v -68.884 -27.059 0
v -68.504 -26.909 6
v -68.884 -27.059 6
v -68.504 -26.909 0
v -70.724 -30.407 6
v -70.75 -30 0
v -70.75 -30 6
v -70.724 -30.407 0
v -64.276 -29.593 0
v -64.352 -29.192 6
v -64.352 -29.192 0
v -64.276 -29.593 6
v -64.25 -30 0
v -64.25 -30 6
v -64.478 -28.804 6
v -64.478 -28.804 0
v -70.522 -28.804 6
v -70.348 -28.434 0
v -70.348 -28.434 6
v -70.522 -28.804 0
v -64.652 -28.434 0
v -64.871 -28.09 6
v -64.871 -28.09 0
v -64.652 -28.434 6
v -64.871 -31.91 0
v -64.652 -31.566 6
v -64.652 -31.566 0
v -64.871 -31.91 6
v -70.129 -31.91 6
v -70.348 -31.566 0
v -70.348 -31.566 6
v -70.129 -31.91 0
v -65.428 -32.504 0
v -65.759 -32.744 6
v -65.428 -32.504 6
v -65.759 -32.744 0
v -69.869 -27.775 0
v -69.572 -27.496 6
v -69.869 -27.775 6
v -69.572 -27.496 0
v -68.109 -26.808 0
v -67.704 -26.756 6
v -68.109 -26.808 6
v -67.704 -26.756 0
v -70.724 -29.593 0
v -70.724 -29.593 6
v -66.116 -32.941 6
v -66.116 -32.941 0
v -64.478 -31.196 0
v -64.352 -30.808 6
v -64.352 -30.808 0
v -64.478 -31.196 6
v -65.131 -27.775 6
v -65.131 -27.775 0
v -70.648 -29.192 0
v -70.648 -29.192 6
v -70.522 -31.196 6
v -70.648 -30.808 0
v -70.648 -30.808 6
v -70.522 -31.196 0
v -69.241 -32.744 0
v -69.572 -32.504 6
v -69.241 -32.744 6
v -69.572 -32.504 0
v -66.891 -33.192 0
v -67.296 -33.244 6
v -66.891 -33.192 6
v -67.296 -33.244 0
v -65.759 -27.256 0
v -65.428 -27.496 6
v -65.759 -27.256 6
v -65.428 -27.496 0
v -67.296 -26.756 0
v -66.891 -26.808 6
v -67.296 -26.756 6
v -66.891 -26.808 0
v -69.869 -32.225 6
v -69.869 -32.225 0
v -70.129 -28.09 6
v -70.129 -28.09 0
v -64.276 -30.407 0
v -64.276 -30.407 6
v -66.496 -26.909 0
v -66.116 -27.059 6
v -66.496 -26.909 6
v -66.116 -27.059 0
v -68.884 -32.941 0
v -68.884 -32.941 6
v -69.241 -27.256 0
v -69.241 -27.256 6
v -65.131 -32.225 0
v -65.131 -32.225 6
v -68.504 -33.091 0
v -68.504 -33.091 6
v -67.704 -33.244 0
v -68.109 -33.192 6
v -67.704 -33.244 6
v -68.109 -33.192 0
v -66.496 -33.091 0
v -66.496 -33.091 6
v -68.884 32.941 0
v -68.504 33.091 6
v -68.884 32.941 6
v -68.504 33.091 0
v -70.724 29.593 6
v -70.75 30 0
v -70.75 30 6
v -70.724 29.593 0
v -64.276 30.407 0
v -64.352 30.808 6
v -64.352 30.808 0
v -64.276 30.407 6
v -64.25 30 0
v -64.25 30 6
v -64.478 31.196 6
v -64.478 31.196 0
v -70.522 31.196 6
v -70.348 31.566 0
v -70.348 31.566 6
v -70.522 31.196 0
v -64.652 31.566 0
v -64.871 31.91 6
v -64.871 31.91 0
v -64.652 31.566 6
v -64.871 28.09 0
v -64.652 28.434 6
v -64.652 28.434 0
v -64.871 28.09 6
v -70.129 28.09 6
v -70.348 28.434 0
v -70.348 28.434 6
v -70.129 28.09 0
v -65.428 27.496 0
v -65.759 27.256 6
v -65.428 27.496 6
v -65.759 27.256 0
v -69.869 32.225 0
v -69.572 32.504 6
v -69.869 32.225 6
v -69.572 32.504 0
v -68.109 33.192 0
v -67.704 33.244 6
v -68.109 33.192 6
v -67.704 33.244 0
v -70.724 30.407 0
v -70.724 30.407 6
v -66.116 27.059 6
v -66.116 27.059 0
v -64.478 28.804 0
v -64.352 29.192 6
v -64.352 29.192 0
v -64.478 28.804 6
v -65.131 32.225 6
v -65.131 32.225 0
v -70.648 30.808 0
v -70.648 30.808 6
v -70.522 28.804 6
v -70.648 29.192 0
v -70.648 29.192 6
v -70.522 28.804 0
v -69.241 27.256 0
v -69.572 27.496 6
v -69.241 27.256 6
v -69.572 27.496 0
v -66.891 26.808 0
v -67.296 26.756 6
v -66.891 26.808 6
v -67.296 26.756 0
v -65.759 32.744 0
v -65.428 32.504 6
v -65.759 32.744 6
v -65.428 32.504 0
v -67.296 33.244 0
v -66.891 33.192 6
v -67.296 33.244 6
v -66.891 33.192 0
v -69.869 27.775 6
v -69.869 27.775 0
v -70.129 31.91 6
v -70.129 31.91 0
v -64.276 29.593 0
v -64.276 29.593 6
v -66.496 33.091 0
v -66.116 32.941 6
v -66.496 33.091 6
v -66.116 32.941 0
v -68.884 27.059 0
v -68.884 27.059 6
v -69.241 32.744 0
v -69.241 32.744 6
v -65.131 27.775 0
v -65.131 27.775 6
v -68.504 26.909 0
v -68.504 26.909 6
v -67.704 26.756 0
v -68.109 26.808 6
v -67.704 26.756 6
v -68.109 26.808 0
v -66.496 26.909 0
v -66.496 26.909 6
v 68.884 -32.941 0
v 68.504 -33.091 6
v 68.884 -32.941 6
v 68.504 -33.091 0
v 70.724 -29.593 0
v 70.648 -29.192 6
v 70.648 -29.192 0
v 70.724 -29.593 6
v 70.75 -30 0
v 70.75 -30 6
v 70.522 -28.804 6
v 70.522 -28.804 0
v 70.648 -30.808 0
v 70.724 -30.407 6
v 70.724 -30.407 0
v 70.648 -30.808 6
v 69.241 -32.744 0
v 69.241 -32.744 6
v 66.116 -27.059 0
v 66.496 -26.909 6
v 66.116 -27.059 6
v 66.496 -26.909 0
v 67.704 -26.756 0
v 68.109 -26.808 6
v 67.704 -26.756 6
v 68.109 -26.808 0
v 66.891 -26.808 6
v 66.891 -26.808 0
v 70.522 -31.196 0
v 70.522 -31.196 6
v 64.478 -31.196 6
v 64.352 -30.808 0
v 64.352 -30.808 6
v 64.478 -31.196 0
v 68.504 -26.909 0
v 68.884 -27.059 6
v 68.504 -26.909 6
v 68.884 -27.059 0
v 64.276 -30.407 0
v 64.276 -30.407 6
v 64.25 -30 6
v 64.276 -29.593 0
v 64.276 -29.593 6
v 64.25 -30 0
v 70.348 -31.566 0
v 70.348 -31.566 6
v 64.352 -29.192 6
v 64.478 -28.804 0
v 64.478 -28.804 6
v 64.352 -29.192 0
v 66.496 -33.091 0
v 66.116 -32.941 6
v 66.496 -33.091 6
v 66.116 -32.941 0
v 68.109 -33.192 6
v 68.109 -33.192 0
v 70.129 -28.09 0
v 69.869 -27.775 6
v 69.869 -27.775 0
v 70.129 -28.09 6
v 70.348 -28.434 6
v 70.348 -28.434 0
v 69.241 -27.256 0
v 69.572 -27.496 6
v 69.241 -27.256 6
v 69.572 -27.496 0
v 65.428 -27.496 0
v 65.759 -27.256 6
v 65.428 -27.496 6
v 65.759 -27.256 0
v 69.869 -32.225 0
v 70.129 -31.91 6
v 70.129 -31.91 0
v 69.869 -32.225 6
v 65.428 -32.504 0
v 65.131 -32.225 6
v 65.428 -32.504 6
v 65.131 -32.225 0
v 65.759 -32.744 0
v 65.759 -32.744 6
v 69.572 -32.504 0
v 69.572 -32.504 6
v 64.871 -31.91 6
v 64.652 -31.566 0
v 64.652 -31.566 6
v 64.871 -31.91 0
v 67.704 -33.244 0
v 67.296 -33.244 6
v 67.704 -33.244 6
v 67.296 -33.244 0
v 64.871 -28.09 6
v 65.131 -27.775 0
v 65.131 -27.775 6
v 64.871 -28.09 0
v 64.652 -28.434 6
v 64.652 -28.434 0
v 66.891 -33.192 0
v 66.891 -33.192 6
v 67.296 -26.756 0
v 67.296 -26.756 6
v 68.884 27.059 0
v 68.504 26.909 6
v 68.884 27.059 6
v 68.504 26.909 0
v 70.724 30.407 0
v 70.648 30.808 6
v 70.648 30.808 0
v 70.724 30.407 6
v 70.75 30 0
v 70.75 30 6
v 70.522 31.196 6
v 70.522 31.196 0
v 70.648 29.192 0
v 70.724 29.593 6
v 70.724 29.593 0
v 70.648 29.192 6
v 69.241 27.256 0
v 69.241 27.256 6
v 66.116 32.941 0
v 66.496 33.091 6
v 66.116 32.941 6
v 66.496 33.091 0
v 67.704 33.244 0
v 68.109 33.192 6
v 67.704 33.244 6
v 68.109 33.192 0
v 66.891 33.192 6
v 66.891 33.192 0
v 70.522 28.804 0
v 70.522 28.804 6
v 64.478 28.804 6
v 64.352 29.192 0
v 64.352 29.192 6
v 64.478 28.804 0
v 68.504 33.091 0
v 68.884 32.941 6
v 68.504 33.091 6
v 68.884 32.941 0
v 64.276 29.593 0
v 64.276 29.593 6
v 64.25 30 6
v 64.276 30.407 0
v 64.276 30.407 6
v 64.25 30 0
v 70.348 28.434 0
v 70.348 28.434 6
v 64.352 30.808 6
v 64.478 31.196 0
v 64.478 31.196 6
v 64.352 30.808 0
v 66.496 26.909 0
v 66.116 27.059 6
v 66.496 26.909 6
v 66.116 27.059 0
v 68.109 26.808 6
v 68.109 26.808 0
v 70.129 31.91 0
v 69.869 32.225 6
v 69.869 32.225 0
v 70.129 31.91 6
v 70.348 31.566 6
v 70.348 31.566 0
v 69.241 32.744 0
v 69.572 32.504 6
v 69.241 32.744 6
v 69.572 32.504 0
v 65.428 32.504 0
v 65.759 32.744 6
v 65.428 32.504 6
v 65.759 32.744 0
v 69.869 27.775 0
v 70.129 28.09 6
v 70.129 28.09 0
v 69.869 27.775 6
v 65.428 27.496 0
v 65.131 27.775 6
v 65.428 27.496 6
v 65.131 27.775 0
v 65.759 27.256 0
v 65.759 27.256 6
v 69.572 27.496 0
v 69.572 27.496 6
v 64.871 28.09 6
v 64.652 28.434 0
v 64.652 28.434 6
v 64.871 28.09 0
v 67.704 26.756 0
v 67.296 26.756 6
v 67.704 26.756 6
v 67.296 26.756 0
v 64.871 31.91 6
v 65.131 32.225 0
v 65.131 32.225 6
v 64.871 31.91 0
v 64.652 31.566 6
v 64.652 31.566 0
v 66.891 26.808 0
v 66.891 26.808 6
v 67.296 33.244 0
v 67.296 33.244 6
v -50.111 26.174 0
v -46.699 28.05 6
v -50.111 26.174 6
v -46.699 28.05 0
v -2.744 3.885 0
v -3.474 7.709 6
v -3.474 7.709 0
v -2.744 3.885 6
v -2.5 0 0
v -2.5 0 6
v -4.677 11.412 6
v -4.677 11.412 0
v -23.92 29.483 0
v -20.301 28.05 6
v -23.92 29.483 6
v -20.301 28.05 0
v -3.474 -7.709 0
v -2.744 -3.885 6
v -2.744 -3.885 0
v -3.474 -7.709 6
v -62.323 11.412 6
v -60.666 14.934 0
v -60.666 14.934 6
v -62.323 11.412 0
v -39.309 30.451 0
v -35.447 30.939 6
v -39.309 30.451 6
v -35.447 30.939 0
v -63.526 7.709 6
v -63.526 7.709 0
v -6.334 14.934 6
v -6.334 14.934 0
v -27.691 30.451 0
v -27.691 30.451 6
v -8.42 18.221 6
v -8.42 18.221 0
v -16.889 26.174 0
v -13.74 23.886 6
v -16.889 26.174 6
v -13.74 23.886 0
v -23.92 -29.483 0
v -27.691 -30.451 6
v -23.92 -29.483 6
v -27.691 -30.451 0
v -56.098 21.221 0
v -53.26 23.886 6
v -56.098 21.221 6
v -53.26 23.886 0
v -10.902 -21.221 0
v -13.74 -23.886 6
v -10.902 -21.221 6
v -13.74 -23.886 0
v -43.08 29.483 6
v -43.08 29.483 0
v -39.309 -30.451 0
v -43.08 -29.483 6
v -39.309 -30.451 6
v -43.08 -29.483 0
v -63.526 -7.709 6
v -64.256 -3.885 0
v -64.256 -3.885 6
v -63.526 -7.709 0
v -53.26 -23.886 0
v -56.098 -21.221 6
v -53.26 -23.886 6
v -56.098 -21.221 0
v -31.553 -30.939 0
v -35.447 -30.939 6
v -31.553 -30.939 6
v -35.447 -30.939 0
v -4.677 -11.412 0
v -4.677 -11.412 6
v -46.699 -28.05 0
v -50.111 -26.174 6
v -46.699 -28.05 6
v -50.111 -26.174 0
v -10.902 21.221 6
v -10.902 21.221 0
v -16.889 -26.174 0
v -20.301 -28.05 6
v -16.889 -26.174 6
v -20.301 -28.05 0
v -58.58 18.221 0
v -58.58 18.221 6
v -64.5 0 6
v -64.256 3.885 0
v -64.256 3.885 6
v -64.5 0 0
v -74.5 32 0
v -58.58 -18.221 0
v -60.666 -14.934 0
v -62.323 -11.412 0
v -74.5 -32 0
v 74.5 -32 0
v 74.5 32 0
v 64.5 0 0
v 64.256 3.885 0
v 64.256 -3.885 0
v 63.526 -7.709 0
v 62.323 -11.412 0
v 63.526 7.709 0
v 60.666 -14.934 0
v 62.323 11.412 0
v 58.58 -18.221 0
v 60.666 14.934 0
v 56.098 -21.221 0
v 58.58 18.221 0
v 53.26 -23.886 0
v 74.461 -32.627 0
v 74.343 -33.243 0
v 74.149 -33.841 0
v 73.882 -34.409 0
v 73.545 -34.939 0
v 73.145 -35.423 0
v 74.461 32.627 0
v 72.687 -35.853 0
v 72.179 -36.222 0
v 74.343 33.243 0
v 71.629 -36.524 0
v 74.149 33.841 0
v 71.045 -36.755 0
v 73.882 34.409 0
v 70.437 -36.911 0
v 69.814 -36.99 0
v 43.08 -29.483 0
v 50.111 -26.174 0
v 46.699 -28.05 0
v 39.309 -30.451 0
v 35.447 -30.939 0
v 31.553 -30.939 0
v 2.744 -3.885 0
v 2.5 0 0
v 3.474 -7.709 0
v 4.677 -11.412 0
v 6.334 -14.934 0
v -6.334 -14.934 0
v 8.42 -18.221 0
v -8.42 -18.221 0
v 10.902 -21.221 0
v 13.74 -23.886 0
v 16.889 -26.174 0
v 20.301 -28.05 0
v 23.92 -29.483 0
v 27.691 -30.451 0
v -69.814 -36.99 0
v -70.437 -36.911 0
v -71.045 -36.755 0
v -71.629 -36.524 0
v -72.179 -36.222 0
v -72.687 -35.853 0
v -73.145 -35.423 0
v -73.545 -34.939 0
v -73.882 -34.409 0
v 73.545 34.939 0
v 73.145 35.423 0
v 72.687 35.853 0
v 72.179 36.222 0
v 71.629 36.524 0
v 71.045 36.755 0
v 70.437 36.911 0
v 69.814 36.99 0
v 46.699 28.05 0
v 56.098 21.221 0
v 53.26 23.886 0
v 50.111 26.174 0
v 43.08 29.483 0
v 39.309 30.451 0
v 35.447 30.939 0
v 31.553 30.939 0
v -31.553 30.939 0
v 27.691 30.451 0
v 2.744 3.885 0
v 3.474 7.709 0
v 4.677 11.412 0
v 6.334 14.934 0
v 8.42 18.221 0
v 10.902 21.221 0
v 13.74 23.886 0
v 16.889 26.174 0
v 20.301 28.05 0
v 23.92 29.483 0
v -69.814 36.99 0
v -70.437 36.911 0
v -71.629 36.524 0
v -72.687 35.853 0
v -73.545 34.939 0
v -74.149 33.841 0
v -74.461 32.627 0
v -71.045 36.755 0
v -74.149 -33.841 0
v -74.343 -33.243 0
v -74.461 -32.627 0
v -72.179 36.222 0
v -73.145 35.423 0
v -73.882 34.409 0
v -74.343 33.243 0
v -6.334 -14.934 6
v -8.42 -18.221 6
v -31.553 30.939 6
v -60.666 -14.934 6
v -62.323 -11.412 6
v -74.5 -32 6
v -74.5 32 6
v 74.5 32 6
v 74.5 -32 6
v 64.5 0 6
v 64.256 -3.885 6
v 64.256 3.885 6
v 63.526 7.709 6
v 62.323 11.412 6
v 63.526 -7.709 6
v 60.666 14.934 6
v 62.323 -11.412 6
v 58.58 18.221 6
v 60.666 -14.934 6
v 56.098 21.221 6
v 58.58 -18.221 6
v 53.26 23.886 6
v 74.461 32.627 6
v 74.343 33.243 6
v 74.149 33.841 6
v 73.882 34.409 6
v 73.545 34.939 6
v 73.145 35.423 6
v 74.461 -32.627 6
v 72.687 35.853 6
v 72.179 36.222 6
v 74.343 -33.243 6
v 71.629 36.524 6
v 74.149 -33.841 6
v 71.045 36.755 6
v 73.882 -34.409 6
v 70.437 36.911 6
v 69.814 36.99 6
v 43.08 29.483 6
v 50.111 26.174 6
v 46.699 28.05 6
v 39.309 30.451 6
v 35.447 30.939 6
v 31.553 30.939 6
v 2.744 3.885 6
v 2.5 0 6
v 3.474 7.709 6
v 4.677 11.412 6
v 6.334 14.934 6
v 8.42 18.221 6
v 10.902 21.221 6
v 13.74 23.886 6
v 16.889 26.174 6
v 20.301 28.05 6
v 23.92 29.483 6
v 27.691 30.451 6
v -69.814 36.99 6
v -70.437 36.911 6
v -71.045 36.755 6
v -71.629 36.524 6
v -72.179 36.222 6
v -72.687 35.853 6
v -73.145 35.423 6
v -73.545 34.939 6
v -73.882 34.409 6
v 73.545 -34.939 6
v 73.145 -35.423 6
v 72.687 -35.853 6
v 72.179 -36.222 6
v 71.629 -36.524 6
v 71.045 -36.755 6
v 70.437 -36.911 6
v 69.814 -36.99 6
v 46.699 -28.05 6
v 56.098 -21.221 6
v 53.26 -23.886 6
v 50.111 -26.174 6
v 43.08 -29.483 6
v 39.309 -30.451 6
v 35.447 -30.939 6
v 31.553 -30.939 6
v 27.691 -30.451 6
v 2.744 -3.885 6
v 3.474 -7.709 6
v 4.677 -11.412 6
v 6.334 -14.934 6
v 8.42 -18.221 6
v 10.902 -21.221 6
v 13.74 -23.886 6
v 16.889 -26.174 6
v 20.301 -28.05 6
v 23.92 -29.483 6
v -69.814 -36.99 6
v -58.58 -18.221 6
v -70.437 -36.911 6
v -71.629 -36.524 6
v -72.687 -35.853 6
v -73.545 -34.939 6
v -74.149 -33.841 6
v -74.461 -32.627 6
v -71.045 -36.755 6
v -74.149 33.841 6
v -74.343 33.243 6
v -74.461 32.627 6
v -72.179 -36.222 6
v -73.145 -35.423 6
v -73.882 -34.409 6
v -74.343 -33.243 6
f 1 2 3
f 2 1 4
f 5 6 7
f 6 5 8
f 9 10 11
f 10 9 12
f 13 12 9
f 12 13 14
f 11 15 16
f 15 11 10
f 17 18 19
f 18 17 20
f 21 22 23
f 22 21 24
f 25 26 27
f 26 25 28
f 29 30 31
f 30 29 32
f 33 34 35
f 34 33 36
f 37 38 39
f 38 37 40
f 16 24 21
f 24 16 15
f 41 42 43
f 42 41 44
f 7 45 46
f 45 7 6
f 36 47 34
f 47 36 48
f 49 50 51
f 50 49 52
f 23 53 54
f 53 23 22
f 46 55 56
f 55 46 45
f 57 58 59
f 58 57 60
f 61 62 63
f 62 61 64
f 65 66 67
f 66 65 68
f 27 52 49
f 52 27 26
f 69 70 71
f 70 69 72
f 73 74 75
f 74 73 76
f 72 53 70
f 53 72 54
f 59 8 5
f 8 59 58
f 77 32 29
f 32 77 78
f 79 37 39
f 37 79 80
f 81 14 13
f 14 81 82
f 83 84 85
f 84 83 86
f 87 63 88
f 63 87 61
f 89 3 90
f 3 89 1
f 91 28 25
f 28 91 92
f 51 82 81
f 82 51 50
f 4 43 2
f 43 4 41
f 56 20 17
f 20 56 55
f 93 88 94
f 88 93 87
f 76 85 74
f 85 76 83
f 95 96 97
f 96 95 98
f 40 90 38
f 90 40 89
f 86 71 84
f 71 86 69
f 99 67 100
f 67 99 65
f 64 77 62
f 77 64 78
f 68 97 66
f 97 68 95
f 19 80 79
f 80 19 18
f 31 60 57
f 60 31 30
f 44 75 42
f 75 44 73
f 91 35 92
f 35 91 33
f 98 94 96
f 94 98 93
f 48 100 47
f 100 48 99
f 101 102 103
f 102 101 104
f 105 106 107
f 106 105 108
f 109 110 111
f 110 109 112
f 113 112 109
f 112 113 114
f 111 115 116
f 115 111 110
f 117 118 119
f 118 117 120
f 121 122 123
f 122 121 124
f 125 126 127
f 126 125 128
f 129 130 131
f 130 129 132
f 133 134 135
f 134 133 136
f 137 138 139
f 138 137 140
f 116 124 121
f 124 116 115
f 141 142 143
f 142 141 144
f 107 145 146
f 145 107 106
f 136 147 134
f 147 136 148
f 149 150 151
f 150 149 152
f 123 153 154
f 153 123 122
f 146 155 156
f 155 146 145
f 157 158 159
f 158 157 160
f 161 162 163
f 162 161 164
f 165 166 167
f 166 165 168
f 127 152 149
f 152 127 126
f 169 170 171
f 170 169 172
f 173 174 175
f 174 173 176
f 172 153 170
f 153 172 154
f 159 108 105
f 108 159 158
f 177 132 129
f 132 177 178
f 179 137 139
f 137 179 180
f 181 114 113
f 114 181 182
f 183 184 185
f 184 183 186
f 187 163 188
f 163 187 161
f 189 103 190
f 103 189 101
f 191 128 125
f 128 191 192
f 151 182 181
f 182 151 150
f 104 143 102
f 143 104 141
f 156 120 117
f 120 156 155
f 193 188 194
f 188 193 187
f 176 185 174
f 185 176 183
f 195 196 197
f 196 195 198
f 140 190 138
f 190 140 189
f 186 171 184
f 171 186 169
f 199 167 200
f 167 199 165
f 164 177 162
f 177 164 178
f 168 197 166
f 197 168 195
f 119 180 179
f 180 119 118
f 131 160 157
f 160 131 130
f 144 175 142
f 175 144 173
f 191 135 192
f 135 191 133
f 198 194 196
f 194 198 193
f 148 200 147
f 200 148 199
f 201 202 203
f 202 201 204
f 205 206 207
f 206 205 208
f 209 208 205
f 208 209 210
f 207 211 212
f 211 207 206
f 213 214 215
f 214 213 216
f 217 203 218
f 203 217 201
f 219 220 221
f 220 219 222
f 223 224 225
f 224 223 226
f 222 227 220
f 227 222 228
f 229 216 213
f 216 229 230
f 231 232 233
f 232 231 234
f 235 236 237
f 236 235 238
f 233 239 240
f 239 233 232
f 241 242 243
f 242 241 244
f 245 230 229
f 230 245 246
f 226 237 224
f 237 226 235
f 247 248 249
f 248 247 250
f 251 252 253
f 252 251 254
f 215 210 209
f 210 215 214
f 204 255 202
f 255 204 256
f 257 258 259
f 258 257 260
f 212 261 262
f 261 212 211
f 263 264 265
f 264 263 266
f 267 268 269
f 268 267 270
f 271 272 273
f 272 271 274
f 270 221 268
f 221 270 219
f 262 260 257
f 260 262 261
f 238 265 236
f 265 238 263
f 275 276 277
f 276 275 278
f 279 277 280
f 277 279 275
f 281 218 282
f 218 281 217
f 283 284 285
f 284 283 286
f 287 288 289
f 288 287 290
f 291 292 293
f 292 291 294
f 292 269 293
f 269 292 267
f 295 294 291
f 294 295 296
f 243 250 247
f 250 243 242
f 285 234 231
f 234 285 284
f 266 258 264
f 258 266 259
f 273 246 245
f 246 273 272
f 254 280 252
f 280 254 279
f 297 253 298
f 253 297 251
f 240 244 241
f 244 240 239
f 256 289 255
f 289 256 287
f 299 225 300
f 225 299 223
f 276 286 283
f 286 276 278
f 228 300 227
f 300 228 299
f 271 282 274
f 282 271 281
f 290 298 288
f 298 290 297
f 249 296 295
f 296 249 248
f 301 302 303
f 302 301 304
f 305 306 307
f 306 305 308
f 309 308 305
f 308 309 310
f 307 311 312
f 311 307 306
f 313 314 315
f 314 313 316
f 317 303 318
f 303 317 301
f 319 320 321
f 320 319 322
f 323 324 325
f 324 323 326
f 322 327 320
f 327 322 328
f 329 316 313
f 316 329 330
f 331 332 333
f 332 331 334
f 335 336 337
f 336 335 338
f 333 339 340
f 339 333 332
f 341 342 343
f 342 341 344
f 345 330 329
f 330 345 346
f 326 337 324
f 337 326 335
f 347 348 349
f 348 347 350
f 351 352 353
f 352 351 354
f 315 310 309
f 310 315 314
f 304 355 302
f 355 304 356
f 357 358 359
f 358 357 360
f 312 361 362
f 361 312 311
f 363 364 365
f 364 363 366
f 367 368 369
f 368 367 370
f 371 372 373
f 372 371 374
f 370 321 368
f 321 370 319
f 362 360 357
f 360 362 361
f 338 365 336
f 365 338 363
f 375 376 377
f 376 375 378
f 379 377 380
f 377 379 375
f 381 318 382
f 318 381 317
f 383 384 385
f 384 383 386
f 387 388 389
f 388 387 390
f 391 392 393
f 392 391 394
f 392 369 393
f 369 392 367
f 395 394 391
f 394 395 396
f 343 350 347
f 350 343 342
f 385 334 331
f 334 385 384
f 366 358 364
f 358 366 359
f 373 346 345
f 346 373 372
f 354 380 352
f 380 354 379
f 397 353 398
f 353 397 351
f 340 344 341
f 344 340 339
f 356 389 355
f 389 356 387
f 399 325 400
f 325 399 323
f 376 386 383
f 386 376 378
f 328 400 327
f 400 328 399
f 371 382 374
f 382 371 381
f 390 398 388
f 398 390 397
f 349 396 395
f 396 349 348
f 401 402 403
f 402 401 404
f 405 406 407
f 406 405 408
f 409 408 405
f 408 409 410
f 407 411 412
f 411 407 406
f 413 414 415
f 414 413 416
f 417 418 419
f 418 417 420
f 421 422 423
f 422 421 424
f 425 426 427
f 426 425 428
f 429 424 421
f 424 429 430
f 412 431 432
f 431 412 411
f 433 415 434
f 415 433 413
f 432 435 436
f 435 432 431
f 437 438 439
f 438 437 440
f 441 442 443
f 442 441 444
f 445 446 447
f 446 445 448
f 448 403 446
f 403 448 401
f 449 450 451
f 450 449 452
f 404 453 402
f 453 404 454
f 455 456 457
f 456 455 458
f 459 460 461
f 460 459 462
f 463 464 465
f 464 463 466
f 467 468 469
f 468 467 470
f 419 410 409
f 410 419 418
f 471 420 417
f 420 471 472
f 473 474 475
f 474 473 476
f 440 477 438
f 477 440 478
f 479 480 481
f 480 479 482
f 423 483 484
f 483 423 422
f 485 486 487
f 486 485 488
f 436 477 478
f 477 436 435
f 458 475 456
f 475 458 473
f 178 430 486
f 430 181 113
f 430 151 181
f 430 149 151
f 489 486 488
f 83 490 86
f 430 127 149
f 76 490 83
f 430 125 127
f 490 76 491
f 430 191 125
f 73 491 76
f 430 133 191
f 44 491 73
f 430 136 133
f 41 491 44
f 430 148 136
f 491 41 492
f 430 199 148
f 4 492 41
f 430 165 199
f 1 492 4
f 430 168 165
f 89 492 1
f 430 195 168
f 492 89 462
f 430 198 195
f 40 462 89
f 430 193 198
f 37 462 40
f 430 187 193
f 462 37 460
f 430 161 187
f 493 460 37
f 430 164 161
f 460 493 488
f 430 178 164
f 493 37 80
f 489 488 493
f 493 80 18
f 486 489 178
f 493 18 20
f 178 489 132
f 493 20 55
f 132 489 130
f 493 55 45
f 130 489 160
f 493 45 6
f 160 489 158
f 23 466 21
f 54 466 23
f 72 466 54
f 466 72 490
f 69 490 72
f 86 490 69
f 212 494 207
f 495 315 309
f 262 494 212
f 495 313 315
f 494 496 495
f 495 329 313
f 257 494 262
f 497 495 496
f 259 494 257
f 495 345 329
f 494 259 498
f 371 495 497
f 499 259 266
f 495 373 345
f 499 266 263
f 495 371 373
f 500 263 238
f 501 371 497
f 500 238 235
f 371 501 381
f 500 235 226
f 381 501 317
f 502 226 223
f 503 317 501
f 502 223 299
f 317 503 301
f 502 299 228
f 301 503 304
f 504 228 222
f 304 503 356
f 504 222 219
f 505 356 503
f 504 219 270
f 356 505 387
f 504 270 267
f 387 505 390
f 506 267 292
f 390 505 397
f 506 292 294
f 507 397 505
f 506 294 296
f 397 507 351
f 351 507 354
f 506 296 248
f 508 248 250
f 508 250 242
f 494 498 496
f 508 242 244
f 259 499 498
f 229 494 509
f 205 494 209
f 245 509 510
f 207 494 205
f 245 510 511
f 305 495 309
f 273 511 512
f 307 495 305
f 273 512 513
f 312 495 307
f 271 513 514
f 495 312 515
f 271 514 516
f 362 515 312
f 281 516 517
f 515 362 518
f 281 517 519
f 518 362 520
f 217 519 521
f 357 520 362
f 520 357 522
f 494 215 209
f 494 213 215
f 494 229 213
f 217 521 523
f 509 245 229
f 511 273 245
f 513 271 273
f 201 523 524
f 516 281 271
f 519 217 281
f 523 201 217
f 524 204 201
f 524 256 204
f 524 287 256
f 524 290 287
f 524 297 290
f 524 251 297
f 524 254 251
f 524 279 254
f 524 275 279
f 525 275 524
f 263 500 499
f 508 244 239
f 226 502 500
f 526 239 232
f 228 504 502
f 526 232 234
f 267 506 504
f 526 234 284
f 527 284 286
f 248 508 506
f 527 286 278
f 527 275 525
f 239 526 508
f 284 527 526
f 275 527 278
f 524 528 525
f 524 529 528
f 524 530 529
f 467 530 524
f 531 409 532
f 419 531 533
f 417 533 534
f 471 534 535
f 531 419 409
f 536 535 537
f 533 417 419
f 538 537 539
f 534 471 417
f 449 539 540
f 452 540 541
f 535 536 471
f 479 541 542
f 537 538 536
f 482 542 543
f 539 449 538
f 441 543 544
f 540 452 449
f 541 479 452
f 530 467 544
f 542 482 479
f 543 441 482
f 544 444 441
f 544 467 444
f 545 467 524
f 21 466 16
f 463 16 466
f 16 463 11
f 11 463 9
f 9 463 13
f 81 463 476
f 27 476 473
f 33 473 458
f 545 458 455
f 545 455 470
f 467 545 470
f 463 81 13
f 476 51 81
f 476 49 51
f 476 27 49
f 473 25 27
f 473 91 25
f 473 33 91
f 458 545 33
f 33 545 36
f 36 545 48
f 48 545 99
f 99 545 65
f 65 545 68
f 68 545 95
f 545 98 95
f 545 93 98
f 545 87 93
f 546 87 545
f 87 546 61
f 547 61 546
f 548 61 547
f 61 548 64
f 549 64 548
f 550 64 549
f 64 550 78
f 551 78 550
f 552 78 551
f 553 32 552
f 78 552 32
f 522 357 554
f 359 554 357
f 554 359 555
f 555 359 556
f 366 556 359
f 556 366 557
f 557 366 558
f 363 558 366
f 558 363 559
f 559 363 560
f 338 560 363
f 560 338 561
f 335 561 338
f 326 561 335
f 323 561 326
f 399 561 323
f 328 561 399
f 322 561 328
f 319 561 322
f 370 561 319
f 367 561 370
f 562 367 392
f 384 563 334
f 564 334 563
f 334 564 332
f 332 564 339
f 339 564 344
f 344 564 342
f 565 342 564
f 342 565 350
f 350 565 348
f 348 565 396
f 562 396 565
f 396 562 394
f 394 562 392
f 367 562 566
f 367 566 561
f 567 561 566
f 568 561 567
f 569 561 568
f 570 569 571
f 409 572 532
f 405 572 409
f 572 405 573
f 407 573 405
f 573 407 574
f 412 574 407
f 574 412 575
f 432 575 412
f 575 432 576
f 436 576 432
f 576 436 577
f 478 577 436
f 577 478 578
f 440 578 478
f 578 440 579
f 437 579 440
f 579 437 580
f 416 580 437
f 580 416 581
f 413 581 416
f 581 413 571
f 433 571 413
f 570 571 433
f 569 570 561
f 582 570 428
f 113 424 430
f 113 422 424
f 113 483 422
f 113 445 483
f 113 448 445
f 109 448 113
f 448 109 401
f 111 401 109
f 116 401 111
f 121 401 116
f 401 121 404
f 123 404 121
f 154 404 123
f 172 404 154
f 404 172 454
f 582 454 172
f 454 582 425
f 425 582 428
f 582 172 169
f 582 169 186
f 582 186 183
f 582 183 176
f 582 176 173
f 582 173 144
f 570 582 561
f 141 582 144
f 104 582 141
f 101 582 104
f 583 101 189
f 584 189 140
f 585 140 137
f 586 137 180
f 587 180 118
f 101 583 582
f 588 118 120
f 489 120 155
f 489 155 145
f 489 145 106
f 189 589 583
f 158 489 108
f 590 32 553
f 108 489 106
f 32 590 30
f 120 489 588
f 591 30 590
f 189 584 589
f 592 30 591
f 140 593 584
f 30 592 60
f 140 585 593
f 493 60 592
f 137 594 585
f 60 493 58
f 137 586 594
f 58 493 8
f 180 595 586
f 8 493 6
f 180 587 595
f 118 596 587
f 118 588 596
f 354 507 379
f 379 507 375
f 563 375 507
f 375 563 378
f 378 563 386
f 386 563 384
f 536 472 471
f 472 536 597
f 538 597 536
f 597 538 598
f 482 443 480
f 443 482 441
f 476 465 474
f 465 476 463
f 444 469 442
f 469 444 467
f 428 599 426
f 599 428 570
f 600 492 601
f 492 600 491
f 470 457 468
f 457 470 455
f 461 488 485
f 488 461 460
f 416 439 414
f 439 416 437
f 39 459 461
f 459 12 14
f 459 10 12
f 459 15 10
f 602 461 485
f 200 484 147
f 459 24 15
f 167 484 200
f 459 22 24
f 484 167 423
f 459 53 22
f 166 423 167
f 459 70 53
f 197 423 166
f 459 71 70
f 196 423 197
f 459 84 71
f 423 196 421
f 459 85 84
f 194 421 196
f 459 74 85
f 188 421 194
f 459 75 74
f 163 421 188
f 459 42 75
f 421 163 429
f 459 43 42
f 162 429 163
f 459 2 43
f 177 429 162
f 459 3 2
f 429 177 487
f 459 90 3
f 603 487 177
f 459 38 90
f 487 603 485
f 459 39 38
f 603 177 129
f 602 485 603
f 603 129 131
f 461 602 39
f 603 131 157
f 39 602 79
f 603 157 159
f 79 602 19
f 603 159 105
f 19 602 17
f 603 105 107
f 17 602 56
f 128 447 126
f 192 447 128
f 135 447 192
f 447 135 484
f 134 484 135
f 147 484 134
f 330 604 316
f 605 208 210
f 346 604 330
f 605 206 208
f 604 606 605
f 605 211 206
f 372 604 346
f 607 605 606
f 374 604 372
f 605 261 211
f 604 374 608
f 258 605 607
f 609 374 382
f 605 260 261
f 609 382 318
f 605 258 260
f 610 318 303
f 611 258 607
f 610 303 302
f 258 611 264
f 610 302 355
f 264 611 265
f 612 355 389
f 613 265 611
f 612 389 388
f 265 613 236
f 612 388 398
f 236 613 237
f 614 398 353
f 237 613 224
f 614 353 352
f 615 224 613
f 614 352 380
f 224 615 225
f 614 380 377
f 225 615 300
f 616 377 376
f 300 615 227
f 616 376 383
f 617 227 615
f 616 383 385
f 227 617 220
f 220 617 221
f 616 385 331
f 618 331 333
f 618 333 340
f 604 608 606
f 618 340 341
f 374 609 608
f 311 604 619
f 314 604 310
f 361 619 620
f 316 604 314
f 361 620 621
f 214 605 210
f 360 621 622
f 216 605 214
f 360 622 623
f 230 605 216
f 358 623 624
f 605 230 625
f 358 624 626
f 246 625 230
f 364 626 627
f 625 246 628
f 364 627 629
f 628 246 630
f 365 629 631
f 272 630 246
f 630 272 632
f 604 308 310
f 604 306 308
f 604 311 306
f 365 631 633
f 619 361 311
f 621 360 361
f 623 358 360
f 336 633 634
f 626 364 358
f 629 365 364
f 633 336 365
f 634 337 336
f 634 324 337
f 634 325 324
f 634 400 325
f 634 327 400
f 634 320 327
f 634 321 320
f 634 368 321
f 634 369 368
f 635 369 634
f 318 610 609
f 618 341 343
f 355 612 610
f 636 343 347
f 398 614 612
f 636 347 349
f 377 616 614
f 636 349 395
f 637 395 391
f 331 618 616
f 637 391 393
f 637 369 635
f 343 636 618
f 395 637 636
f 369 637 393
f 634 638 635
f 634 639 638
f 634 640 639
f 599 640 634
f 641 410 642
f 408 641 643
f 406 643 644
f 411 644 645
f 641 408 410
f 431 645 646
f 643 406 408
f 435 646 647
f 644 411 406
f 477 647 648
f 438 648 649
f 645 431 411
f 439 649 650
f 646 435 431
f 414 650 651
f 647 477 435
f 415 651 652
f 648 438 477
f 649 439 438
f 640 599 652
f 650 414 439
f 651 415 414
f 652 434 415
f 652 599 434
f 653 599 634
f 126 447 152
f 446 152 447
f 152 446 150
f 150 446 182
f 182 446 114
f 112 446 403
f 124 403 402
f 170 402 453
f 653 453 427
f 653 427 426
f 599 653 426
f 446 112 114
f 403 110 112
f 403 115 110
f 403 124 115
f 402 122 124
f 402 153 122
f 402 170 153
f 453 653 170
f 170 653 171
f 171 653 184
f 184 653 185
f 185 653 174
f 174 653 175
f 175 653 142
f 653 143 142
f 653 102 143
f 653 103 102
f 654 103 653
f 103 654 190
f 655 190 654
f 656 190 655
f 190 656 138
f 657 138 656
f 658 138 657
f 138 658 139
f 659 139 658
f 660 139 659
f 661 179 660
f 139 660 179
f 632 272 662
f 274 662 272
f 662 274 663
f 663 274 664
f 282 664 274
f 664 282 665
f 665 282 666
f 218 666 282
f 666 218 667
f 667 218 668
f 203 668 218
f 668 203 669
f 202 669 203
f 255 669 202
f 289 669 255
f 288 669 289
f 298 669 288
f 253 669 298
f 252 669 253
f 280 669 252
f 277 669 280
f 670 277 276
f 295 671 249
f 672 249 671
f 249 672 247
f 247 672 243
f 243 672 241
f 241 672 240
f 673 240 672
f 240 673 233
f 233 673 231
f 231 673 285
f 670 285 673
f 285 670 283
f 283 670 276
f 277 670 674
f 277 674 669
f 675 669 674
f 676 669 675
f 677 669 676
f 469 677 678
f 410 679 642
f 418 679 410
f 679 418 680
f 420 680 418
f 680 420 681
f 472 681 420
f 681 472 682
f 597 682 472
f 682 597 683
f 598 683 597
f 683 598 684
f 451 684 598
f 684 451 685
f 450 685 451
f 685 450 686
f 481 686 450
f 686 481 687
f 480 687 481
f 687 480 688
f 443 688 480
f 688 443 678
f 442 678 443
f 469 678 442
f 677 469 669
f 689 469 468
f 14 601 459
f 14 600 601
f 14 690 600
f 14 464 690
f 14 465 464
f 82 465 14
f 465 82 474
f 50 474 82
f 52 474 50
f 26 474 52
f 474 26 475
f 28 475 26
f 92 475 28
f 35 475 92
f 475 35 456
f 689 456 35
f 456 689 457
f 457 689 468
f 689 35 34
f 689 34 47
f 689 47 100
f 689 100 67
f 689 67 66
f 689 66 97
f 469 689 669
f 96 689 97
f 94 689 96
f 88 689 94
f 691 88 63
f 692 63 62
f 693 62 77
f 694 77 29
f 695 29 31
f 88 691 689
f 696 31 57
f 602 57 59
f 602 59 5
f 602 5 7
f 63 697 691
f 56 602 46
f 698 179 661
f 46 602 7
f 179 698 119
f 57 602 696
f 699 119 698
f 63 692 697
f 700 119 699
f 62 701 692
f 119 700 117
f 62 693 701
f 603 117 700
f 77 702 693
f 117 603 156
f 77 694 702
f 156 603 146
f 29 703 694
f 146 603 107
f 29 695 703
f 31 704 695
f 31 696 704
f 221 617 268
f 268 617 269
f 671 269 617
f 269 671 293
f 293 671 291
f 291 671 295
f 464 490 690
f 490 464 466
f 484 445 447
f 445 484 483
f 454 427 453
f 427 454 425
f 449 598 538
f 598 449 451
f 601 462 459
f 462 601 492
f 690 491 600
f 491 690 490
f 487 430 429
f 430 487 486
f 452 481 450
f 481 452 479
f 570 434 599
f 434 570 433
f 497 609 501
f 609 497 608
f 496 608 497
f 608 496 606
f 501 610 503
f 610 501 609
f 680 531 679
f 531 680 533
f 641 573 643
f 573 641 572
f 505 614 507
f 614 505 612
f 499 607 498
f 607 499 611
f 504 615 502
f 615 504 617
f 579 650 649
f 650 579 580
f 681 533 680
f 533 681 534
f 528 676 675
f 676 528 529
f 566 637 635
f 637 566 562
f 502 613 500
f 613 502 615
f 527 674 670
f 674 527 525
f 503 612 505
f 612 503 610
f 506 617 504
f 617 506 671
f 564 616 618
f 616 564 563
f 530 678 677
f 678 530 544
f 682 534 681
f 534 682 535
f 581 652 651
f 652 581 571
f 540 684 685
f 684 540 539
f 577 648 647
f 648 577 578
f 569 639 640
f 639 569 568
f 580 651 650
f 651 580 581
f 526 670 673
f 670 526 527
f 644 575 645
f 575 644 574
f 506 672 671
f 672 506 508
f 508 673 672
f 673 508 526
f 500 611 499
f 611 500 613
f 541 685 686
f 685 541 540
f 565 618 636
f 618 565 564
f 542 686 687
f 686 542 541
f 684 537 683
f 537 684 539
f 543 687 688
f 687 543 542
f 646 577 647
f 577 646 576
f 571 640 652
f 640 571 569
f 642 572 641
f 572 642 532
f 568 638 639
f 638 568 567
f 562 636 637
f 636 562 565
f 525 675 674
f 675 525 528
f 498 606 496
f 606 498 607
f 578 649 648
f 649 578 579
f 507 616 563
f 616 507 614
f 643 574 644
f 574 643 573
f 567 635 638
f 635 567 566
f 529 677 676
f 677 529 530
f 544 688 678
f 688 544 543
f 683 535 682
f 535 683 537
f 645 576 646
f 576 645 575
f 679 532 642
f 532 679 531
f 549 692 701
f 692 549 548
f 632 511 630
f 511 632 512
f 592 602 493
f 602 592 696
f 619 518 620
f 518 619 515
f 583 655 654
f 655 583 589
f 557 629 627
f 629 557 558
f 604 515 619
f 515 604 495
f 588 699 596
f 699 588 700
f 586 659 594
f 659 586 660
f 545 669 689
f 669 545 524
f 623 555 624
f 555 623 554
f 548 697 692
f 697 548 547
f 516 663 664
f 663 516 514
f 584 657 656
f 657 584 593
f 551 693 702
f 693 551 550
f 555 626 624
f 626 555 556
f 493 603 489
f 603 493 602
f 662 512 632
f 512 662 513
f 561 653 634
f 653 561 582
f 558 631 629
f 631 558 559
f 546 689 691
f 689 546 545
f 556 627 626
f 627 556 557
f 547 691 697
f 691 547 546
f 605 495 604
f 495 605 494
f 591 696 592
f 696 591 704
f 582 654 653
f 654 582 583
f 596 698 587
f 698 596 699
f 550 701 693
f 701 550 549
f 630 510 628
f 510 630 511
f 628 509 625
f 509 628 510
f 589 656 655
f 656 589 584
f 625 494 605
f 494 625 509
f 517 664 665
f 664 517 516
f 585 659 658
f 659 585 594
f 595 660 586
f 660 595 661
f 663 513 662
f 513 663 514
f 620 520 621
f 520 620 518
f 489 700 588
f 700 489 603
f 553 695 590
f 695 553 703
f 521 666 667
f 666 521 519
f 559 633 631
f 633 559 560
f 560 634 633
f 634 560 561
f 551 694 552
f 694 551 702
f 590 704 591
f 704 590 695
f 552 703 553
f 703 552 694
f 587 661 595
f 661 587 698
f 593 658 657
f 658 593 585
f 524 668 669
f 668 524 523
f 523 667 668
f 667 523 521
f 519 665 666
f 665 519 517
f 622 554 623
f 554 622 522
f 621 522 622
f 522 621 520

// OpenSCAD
$fn = 50;


difference() {
	union() {
		hull() {
			translate(v = [-69.5000000000, 32.0000000000, 0]) {
				cylinder(h = 6, r = 5);
			}
			translate(v = [69.5000000000, 32.0000000000, 0]) {
				cylinder(h = 6, r = 5);
			}
			translate(v = [-69.5000000000, -32.0000000000, 0]) {
				cylinder(h = 6, r = 5);
			}
			translate(v = [69.5000000000, -32.0000000000, 0]) {
				cylinder(h = 6, r = 5);
			}
		}
	}
	union() {
		#translate(v = [-67.5000000000, -30.0000000000, -100.0000000000]) {
			cylinder(h = 200, r = 3.2500000000);
		}
		#translate(v = [-67.5000000000, 30.0000000000, -100.0000000000]) {
			cylinder(h = 200, r = 3.2500000000);
		}
		#translate(v = [67.5000000000, -30.0000000000, -100.0000000000]) {
			cylinder(h = 200, r = 3.2500000000);
		}
		#translate(v = [67.5000000000, 30.0000000000, -100.0000000000]) {
			cylinder(h = 200, r = 3.2500000000);
		}
		#translate(v = [-33.5000000000, 0, 0]) {
			cylinder(h = 6, r = 31.0000000000);
		}
		#translate(v = [33.5000000000, 0, 0]) {
			cylinder(h = 6, r = 31.0000000000);
		}
	}
}
